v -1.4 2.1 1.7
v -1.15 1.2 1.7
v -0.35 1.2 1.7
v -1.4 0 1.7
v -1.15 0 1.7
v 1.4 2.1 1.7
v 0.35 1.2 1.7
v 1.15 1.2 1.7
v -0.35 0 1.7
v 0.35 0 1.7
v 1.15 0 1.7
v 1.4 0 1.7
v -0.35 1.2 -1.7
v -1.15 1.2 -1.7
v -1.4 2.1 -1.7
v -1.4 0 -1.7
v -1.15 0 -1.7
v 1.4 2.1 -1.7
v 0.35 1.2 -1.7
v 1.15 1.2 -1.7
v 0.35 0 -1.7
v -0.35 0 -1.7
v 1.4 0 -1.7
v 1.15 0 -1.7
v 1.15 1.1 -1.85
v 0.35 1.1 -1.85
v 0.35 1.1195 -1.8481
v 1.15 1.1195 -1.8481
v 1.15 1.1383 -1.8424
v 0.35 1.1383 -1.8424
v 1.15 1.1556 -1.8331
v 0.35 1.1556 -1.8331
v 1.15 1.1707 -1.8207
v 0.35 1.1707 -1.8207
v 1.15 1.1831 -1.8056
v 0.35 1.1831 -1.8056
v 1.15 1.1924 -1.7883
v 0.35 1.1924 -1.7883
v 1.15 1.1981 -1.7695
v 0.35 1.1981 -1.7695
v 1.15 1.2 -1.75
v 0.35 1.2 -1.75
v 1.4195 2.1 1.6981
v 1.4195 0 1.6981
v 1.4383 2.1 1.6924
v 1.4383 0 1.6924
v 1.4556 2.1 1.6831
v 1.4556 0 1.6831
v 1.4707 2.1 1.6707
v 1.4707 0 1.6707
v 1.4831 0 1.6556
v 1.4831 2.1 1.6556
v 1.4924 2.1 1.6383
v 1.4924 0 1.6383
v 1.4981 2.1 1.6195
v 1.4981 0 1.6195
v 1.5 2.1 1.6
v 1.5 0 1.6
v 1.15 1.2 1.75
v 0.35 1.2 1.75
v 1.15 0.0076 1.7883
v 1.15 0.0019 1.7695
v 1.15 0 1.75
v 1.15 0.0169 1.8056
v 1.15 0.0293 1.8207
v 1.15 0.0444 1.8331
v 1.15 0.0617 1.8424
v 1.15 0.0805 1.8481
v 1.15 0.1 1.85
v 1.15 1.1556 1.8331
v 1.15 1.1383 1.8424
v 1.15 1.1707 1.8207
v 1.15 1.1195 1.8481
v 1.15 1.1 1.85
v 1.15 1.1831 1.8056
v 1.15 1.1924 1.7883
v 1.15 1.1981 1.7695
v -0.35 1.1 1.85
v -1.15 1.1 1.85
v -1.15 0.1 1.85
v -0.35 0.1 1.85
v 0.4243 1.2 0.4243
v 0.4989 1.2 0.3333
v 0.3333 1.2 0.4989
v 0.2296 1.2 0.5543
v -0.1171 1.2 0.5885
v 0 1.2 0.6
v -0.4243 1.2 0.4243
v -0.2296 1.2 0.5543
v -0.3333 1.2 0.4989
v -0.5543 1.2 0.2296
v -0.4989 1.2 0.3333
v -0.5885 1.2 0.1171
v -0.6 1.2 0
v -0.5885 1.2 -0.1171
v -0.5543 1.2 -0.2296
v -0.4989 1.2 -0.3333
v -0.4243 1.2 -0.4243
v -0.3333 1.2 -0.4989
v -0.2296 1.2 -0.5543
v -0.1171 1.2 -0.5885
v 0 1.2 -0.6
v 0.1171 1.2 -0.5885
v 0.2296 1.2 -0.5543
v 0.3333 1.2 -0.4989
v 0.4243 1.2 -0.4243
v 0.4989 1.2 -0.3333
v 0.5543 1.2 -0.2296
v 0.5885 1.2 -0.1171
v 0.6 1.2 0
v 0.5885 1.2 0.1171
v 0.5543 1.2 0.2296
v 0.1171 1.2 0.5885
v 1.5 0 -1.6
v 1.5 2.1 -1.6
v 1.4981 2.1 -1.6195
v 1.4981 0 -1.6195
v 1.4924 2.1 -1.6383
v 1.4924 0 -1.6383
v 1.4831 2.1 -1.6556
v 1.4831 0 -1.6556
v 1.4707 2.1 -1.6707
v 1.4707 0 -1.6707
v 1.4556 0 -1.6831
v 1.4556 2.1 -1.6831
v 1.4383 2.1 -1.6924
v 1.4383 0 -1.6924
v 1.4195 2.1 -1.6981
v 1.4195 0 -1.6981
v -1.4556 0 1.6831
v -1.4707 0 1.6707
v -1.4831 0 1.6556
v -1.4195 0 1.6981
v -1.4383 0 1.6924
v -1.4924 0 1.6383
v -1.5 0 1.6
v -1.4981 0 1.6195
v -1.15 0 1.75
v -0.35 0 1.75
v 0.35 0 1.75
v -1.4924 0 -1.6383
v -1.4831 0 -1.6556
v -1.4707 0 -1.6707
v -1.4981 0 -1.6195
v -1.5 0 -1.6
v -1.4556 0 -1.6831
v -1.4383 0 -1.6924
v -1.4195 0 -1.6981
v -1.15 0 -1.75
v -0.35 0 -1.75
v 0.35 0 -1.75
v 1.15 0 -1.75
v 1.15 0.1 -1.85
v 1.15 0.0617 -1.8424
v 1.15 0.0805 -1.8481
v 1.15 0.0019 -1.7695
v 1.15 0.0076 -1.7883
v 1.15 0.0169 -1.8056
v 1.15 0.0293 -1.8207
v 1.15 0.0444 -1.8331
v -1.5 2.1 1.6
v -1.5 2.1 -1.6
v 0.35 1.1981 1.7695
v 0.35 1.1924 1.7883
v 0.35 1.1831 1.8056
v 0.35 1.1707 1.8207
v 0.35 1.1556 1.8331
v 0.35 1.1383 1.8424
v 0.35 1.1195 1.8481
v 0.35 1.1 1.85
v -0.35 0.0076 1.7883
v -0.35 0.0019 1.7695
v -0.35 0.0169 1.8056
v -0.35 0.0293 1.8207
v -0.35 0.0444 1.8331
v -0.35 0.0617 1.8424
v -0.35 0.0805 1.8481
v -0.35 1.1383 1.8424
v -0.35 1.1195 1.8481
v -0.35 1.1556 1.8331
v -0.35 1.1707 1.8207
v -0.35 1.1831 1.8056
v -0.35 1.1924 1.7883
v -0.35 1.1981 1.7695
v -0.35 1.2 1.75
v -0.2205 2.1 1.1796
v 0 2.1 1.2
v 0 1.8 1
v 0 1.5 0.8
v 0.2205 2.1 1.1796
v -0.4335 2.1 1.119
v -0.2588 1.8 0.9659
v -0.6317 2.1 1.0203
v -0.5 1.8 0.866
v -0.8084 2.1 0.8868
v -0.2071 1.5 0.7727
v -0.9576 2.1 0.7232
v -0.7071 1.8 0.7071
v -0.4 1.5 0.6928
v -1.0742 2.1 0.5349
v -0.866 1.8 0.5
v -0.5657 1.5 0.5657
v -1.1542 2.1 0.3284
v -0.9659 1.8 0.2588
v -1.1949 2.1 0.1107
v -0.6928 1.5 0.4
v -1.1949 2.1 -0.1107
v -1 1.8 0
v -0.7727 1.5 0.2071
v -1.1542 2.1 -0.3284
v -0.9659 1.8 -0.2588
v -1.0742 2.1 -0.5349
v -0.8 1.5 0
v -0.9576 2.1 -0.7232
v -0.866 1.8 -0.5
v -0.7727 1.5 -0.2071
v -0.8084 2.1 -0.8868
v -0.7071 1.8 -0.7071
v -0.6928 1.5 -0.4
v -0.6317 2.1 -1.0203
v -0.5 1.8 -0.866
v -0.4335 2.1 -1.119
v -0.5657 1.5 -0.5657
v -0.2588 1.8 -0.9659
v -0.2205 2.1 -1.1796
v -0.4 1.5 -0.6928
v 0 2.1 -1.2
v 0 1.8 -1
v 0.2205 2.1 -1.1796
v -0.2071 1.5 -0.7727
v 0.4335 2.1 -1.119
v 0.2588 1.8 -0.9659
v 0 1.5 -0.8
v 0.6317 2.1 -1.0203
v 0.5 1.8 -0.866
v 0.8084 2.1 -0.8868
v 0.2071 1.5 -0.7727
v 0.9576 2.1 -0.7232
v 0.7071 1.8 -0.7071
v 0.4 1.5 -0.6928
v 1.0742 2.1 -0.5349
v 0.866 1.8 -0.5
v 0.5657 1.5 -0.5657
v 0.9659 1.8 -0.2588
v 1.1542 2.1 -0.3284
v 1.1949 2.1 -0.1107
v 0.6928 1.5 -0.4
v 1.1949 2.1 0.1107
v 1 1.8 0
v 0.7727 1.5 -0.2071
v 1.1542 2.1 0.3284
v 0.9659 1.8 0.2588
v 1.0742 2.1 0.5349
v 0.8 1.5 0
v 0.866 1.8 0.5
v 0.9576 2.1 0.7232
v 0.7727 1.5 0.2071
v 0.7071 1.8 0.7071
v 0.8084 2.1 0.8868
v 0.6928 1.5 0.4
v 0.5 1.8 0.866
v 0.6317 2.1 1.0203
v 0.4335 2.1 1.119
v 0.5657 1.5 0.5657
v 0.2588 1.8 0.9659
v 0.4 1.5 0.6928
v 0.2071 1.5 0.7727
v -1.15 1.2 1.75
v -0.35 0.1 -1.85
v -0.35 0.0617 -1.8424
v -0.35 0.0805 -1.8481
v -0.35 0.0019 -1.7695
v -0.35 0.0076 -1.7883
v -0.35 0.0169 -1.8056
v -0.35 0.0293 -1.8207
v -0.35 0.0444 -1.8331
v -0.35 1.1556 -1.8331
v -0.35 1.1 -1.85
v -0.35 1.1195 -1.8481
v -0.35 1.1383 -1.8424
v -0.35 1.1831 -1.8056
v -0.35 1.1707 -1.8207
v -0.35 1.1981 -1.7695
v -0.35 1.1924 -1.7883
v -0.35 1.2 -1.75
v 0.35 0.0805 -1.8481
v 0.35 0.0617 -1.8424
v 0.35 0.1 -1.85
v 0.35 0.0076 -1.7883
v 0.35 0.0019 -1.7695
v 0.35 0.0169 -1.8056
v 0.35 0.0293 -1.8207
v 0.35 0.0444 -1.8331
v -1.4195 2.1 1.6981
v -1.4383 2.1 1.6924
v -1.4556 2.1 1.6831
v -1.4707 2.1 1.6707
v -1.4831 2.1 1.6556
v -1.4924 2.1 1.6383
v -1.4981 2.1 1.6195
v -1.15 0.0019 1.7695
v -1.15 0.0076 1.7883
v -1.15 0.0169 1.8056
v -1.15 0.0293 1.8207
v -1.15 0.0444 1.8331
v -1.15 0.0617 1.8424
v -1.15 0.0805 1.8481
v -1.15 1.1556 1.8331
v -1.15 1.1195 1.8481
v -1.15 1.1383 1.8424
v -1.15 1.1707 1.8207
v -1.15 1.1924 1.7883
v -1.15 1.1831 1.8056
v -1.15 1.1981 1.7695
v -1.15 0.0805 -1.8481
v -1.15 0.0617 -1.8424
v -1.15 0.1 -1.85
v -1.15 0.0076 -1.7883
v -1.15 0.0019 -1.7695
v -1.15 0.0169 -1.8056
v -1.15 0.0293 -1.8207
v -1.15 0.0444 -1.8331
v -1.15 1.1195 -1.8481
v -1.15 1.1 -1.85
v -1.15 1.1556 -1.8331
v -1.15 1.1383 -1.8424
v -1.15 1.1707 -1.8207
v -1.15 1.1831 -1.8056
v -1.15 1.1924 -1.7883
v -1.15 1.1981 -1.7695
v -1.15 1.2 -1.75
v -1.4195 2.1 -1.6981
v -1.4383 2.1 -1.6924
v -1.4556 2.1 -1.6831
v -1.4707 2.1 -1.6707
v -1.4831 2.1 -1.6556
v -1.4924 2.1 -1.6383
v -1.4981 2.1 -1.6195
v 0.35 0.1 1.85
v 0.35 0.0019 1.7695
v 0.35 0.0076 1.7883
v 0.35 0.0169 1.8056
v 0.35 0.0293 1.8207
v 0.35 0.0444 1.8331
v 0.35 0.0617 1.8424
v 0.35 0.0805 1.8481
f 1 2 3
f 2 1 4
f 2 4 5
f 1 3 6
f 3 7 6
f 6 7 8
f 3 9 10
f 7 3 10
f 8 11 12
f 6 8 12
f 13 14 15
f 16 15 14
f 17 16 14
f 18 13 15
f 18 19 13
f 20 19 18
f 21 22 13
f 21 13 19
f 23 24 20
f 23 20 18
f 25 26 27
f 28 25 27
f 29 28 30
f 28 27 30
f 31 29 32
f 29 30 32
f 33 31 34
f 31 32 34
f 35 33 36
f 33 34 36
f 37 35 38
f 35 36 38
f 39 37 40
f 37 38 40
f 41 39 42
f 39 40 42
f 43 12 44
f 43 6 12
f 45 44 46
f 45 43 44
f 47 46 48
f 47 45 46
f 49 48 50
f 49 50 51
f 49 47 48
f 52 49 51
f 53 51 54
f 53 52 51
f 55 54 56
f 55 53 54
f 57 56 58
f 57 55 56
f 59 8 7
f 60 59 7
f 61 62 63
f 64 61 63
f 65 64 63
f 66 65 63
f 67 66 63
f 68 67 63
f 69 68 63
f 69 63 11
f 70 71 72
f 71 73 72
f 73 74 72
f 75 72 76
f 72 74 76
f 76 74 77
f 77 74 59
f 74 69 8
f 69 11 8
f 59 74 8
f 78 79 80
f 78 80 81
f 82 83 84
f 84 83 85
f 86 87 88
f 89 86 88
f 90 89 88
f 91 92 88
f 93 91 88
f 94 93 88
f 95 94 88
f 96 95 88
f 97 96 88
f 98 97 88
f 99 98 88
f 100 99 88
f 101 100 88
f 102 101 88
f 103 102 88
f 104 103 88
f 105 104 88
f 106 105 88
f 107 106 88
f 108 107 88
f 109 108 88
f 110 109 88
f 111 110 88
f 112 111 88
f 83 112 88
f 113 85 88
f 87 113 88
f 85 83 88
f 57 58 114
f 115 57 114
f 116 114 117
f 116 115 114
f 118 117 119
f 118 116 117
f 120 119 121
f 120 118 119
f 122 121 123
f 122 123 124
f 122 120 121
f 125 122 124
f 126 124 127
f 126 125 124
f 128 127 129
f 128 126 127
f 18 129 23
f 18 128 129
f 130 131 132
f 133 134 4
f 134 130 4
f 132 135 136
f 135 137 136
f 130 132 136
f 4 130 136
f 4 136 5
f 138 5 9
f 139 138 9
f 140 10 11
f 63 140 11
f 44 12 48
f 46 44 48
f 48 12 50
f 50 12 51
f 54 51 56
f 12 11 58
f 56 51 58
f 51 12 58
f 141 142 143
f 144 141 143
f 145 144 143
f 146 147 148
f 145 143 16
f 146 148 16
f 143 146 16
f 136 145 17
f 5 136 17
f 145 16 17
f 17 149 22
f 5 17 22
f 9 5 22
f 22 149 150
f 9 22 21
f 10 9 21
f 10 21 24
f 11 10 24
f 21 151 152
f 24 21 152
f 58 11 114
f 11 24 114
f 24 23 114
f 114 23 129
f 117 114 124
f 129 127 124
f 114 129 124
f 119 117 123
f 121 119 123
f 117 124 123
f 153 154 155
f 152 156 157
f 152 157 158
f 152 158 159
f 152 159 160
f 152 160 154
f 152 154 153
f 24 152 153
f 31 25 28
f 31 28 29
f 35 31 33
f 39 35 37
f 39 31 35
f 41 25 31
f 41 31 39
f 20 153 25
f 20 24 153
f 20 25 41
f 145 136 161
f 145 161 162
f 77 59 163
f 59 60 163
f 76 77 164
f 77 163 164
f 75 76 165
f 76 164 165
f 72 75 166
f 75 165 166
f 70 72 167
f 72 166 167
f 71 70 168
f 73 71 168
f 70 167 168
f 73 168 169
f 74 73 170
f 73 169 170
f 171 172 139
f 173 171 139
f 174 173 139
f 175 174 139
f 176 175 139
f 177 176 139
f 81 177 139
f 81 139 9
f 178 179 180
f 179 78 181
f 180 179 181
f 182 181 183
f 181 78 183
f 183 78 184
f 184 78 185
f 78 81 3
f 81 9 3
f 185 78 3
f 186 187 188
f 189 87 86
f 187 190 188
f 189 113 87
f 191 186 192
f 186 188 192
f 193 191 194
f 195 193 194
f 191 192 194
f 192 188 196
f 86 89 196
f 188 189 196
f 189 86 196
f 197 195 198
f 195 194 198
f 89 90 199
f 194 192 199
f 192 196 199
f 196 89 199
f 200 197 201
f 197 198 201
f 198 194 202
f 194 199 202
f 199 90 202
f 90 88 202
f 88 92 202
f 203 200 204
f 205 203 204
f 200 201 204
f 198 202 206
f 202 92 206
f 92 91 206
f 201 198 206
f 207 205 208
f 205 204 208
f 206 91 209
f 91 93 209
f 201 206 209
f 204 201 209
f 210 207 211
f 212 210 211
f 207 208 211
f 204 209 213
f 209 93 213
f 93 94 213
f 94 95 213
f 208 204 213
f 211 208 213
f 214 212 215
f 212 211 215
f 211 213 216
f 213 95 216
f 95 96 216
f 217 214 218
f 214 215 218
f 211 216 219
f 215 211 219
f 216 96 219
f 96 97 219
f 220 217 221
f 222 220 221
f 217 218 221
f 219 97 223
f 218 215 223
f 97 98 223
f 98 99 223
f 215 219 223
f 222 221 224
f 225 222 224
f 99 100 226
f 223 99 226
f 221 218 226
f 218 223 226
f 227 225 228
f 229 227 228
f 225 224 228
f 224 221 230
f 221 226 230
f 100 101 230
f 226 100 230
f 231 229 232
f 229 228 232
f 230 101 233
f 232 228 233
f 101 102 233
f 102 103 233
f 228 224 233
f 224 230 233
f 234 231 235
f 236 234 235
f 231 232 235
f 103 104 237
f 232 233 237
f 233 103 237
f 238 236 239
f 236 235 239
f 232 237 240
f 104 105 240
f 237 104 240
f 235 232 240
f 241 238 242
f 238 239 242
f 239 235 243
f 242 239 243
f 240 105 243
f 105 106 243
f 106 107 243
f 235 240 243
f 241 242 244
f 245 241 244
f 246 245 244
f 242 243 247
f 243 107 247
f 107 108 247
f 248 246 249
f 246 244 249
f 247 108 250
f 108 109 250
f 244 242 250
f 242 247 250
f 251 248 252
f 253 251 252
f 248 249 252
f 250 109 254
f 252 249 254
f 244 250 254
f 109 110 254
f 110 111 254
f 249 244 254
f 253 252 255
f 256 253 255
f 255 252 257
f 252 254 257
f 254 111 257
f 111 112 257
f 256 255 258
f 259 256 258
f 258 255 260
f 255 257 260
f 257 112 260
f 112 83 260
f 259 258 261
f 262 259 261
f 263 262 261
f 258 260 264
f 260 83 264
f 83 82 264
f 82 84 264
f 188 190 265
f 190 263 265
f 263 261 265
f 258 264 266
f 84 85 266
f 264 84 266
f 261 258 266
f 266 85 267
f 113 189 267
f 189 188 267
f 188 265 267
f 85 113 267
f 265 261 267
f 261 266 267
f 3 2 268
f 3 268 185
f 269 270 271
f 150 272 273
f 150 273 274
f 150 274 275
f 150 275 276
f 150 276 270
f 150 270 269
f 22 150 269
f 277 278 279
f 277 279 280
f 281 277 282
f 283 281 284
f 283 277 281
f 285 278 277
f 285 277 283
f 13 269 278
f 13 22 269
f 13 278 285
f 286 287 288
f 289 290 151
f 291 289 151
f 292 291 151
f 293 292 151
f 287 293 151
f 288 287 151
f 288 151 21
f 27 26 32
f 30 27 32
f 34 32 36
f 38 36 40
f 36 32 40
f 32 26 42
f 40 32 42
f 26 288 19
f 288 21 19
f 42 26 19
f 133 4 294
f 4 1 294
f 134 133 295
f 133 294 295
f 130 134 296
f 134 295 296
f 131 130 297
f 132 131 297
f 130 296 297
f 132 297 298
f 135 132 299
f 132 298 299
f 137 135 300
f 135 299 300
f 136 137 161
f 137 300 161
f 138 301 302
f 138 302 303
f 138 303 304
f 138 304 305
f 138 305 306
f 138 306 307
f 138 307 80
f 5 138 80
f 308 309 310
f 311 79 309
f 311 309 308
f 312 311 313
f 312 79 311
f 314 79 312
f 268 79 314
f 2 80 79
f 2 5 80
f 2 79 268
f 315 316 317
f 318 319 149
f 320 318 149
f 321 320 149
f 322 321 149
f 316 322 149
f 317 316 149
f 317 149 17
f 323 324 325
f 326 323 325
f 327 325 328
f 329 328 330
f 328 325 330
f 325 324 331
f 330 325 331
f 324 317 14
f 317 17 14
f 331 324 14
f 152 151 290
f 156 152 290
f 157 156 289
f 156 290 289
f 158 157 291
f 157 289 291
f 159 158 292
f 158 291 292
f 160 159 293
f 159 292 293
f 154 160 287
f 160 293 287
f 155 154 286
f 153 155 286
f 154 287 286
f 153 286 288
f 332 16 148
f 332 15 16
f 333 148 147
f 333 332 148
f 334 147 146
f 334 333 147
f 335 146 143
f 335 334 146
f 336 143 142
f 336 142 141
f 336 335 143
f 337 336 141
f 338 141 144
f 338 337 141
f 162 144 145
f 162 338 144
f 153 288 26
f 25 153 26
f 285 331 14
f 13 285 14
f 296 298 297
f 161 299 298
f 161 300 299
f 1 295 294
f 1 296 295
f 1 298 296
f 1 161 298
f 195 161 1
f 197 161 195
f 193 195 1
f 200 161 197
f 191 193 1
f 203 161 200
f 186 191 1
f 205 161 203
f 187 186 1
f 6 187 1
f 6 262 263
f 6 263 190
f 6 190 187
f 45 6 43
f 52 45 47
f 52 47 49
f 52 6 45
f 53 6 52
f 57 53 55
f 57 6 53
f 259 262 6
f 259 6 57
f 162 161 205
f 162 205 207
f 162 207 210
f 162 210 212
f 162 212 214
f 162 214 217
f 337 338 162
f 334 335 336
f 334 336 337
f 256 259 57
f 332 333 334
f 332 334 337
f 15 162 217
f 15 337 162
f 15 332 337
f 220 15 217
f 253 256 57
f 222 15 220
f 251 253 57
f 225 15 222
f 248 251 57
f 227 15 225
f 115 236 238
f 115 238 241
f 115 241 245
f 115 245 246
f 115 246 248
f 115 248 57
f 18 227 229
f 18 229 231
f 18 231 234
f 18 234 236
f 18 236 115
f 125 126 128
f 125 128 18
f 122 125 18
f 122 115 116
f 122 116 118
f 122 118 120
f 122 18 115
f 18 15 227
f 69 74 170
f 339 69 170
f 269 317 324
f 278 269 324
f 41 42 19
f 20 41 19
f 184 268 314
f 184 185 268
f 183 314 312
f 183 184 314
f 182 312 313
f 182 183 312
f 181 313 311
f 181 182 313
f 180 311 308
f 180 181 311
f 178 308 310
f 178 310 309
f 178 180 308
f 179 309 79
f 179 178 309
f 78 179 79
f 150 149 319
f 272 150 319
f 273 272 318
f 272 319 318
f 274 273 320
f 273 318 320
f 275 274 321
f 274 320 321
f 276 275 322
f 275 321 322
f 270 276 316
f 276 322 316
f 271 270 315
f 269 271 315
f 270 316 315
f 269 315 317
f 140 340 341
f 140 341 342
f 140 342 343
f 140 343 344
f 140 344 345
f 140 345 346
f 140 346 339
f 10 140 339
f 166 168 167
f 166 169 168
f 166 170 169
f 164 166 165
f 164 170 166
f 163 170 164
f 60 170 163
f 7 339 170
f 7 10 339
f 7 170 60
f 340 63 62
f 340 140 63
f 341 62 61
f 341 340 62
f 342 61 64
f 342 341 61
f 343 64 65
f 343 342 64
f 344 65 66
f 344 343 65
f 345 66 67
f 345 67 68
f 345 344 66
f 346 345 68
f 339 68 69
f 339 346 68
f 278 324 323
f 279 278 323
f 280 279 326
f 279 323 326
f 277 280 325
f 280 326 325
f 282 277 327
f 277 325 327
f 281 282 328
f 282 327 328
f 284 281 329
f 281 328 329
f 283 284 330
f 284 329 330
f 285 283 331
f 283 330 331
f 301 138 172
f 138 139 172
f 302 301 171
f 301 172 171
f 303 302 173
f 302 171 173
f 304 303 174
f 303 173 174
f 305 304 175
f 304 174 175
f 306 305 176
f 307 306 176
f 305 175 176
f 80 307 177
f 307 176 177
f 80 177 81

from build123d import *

# Parameters (mm, degrees)
SKETCH1_W            = 3
SKETCH1_H            = 3.4
BOSS_EXTRUDE1_DEPTH  = 2.1
SKETCH2_W            = 0.8
SKETCH2_H            = 1.2
BOSS_EXTRUDE2_DEPTH  = 0.15
FILLET1_R            = 0.1
FILLET1_OF_MIRROR1_R = 0.1
MIRROR2_START        = -1.15
MIRROR2_DEPTH        = 0.8
MIRROR2_START_2      = 0.35
MIRROR2_2_DEPTH      = 0.8
FILLET2_R            = 0.1


# Read off the part's stored shape, not the designer's step: Mirror2
with BuildPart() as part:
    # Sketch1 → Boss-Extrude1 (new body)
    with BuildSketch(Plane(origin=(0, 0, 0), x_dir=(1, 0, 0), z_dir=(0, 1, 0))):
        Rectangle(SKETCH1_W, SKETCH1_H)
    extrude(amount=BOSS_EXTRUDE1_DEPTH)

    # Sketch2 → Boss-Extrude2 (add)
    with BuildSketch(Plane.XY.offset(1.7)):
        with Locations((-0.75, 0.6)):
            Rectangle(SKETCH2_W, SKETCH2_H)
    boss_extrude2 = extrude(amount=BOSS_EXTRUDE2_DEPTH)

    # Fillet1
    fillet1_edges = [part.edges().sort_by_distance(p)[0] for p in [
        (-0.75, 0, 1.85),
        (-0.75, 1.2, 1.85),
    ]]
    fillet(fillet1_edges, radius=FILLET1_R)

    # Mirror1: Boss-Extrude2 across plane
    add(boss_extrude2.mirror(Plane(origin=(0, 0, 0), x_dir=(0, 0, 1), z_dir=(1, 0, 0))))

    # Fillet1 of Mirror1
    fillet1_of_mirror1_edges = [part.edges().sort_by_distance(p)[0] for p in [
        (0.75, 0, 1.85),
        (0.75, 1.2, 1.85),
    ]]
    fillet(fillet1_of_mirror1_edges, radius=FILLET1_OF_MIRROR1_R)

    # Mirror2 outline → Mirror2 (add)
    with BuildSketch(Plane.YZ.offset(MIRROR2_START)):
        with BuildLine():
            Line((1.2, -1.75), (1.2, -1.7))
            Line((1.2, -1.7), (0, -1.7))
            Line((0, -1.7), (0, -1.75))
            ThreePointArc((0, -1.75), (0.029289322, -1.820710678), (0.1, -1.85))
            Line((0.1, -1.85), (1.1, -1.85))
            ThreePointArc((1.1, -1.85), (1.170710678, -1.820710678), (1.2, -1.75))
        make_face()
    extrude(amount=MIRROR2_DEPTH)

    # Mirror2 2 outline → Mirror2 2 (add)
    with BuildSketch(Plane.YZ.offset(MIRROR2_START_2)):
        with BuildLine():
            Line((1.2, -1.75), (1.2, -1.7))
            Line((1.2, -1.7), (0, -1.7))
            Line((0, -1.7), (0, -1.75))
            ThreePointArc((0, -1.75), (0.029289322, -1.820710678), (0.1, -1.85))
            Line((0.1, -1.85), (1.1, -1.85))
            ThreePointArc((1.1, -1.85), (1.170710678, -1.820710678), (1.2, -1.75))
        make_face()
    extrude(amount=MIRROR2_2_DEPTH)

    # Sketch11 → Cut-Revolve1 (revolve, cut)
    with BuildSketch(Plane(origin=(0, 0, 0), x_dir=(0, 0, -1), z_dir=(1, 0, 0))):
        Polygon((0, 2.1), (-1.2, 2.1), (-0.6, 1.2), (0, 1.2), align=None)
    revolve(axis=Axis((0, 2.1, 0), (0, -1, 0)), mode=Mode.SUBTRACT)

    # Fillet2
    fillet2_edges = [part.edges().sort_by_distance(p)[0] for p in [
        (-1.5, 1.05, -1.7),
        (1.5, 1.05, -1.7),
        (-1.5, 1.05, 1.7),
        (1.5, 1.05, 1.7),
    ]]
    fillet(fillet2_edges, radius=FILLET2_R)


solid = part.part
